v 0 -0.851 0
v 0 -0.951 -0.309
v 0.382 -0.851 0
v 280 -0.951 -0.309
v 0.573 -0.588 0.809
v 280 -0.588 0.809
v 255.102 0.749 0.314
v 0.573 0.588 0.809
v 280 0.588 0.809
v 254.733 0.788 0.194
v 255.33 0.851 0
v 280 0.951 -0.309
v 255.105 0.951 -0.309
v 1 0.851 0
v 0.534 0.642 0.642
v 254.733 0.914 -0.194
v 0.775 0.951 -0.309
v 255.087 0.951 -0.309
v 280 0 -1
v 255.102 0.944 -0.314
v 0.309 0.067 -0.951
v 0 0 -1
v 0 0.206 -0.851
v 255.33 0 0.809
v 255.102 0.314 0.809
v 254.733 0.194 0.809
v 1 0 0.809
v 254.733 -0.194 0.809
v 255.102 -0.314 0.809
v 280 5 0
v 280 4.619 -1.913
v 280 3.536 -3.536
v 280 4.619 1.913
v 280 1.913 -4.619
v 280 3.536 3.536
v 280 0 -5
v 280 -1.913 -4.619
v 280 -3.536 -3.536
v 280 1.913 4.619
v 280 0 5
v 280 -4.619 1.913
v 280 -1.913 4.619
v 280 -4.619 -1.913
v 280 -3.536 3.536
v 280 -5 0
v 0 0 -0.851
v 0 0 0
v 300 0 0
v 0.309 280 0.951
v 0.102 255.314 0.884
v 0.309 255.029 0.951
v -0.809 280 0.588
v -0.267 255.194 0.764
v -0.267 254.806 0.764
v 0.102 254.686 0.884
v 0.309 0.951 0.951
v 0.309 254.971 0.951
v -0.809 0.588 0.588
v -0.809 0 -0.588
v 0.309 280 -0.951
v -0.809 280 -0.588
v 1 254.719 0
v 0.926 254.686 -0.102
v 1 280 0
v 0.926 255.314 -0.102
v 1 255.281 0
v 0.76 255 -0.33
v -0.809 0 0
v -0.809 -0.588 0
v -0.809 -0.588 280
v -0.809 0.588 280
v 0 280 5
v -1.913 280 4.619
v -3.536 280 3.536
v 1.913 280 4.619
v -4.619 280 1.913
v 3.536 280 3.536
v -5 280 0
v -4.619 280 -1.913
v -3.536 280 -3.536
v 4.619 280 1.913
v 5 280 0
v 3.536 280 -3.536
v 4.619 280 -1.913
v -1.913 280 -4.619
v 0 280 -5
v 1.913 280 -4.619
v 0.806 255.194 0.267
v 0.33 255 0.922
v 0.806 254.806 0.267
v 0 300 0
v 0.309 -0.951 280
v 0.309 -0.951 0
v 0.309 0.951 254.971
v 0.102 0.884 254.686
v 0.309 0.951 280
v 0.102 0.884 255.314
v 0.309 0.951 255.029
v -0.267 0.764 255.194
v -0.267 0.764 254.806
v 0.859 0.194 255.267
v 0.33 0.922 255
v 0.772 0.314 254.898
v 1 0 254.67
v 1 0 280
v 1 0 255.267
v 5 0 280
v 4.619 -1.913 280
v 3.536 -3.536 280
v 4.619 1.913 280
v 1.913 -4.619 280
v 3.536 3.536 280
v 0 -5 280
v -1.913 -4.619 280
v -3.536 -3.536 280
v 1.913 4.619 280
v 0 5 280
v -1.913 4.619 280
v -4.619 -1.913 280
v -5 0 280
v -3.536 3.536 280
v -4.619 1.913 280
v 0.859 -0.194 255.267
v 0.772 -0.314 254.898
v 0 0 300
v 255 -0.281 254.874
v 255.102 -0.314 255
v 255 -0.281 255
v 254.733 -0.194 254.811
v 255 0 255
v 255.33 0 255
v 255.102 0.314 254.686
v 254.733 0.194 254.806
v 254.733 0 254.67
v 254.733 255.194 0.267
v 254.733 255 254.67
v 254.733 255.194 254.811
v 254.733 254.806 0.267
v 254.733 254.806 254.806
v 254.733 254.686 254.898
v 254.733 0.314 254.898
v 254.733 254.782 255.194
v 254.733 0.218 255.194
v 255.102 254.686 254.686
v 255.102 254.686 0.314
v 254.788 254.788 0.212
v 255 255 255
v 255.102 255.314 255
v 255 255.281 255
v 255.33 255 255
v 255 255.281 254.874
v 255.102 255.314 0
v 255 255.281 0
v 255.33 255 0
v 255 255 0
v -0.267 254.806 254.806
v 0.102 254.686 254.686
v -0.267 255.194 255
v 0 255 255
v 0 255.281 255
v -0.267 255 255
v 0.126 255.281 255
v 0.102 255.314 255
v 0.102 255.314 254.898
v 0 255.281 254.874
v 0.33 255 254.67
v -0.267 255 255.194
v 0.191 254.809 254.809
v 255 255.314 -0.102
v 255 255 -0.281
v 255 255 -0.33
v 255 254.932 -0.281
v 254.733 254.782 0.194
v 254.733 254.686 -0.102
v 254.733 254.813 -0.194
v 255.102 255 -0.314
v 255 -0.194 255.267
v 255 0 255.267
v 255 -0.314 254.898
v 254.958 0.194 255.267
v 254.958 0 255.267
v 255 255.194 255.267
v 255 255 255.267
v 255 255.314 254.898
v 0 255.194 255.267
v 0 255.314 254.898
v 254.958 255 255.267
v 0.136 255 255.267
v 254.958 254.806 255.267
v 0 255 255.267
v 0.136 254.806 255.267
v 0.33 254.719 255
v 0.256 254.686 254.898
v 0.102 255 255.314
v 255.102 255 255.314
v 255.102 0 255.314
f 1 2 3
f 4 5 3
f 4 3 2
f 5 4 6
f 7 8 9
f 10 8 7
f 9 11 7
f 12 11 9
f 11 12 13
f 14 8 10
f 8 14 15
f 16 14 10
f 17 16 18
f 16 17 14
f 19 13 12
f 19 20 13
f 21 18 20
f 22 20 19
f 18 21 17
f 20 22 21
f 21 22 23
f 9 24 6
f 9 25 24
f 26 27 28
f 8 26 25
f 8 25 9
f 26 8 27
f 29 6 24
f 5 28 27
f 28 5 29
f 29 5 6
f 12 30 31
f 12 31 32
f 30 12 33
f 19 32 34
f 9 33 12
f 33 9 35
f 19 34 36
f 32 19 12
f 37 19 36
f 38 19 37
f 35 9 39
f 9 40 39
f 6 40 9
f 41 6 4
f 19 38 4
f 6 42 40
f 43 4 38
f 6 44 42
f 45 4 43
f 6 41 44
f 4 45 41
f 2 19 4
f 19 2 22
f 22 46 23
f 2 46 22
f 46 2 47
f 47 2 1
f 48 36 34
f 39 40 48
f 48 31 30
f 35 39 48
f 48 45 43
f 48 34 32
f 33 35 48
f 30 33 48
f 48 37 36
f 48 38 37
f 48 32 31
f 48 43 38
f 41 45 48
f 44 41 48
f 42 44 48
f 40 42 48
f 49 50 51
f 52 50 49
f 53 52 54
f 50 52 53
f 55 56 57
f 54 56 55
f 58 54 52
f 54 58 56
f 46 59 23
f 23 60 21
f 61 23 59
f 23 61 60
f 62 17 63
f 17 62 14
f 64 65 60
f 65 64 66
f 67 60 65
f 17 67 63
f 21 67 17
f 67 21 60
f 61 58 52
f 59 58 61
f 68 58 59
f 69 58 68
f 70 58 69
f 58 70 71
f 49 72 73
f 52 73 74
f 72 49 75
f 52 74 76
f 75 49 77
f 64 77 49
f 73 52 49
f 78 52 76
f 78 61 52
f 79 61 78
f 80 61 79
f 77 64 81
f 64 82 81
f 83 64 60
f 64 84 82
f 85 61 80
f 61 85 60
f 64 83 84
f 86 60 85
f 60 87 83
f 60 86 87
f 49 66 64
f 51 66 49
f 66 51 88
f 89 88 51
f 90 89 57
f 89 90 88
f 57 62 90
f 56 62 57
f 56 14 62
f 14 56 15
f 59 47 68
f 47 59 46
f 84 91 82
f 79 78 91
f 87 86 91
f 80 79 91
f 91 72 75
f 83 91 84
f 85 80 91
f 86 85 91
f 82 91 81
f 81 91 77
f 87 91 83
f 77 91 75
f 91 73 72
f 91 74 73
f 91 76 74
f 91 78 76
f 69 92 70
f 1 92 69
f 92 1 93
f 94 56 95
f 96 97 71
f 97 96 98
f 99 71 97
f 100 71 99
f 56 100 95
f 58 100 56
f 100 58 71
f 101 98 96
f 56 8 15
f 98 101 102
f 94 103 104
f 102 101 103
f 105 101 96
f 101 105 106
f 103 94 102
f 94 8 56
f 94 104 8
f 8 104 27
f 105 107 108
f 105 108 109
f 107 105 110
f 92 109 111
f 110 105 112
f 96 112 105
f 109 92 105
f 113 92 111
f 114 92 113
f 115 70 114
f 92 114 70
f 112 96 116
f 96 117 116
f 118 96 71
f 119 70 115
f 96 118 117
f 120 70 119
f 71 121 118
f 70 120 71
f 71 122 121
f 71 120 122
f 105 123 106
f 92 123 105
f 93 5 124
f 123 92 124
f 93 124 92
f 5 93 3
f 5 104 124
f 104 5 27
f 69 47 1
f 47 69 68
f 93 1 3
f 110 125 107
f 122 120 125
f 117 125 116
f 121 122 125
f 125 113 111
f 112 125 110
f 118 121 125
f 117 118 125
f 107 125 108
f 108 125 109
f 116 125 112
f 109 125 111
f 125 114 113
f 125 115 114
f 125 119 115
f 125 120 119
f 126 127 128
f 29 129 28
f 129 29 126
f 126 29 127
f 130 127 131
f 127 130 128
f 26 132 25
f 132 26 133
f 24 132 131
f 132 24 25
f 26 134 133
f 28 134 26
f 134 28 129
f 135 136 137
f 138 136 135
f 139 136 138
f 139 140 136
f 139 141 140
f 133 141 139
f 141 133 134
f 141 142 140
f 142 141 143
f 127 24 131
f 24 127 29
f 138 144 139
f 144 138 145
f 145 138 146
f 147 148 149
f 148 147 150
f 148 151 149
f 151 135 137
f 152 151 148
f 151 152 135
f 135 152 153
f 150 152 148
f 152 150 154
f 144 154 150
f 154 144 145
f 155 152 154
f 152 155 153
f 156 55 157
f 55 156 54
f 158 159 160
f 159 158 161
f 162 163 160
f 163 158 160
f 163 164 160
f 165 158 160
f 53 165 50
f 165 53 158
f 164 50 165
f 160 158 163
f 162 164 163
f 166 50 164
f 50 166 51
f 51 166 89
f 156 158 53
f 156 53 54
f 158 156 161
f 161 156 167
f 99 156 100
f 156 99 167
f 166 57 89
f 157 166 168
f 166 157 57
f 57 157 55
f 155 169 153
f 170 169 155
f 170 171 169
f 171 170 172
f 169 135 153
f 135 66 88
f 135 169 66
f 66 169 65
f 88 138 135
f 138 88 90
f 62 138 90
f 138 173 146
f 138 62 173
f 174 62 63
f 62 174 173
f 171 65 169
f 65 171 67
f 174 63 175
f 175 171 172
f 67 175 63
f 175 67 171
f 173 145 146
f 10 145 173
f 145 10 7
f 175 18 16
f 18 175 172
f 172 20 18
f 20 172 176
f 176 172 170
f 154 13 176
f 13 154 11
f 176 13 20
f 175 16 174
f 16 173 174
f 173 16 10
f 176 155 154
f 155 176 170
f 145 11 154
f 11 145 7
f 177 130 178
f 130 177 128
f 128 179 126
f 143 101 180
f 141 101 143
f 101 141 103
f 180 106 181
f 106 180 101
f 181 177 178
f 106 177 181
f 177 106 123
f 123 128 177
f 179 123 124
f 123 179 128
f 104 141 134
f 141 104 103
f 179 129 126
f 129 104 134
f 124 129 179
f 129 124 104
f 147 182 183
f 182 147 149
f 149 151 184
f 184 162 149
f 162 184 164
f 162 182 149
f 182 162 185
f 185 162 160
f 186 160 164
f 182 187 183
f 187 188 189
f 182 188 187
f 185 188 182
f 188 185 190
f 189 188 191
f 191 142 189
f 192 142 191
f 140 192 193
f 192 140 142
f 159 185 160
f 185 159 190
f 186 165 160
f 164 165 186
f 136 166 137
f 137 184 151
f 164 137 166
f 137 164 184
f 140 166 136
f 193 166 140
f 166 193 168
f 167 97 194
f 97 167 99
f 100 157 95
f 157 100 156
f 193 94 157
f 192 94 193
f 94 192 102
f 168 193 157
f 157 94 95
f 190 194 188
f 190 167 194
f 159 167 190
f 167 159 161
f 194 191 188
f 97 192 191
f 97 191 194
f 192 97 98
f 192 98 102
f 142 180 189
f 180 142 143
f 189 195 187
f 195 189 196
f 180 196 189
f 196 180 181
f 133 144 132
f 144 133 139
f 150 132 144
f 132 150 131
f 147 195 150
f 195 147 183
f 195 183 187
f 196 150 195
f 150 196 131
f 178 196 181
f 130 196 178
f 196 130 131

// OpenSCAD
// pellet 3D debug diagram

// coordinate system


// X = R
rotate([0, 90, 0])
	arrow(1, 0, 0);

// Y = G
rotate([-90, 0, 0])
	arrow(0, 1, 0);

// Z = B
	arrow(0, 0, 1);


// cube lines 255x255x255
// 3 vertiacal lines
translate([255, 0, 0])
	line();
translate([255, 255, 0])
	line();
translate([0, 255, 0])
	line();

// 2 bottom lines
translate([0, 255, 0])
	rotate([0, 90, 0])
		line();
translate([255, 0, 0])
	rotate([-90, 0, 0])
		line();

// 4 top lines
translate([0, 0, 255])
	rotate([0, 90, 0])
		line();
translate([0, 255, 255])
	rotate([0, 90, 0])
		line();
translate([0, 0, 255])
	rotate([-90, 0, 0])
		line();
translate([255, 0, 255])
	rotate([-90, 0, 0])
		line();


// ====================================================
// sub-modules
// ====================================================

module arrow(R, G, B) {
	dim = .66;
	len = 280;
	head = 20;

	translate([0, 0, len / 2])
		color([R * dim, G * dim, B * dim])
			cylinder(r = 1, h = len, center=true);

	translate([0, 0, len + head / 2])
		color([R * dim, G * dim, B * dim])
			cylinder(r1 = 5, r2 = 0, h = head, center=true);
}

module line() {
	len = 255;

	translate([0, 0, len / 2])
		color([.5,, .5, .5])
			cylinder(r = .33, h = len, center=true);
}


module dot(x, y, z, c) {
	len = 3.33;

	translate([x, y, z])
		color(c)
			sphere(r = len/2, center=true);
}


// ====================================================
// automated content follows
// ====================================================
